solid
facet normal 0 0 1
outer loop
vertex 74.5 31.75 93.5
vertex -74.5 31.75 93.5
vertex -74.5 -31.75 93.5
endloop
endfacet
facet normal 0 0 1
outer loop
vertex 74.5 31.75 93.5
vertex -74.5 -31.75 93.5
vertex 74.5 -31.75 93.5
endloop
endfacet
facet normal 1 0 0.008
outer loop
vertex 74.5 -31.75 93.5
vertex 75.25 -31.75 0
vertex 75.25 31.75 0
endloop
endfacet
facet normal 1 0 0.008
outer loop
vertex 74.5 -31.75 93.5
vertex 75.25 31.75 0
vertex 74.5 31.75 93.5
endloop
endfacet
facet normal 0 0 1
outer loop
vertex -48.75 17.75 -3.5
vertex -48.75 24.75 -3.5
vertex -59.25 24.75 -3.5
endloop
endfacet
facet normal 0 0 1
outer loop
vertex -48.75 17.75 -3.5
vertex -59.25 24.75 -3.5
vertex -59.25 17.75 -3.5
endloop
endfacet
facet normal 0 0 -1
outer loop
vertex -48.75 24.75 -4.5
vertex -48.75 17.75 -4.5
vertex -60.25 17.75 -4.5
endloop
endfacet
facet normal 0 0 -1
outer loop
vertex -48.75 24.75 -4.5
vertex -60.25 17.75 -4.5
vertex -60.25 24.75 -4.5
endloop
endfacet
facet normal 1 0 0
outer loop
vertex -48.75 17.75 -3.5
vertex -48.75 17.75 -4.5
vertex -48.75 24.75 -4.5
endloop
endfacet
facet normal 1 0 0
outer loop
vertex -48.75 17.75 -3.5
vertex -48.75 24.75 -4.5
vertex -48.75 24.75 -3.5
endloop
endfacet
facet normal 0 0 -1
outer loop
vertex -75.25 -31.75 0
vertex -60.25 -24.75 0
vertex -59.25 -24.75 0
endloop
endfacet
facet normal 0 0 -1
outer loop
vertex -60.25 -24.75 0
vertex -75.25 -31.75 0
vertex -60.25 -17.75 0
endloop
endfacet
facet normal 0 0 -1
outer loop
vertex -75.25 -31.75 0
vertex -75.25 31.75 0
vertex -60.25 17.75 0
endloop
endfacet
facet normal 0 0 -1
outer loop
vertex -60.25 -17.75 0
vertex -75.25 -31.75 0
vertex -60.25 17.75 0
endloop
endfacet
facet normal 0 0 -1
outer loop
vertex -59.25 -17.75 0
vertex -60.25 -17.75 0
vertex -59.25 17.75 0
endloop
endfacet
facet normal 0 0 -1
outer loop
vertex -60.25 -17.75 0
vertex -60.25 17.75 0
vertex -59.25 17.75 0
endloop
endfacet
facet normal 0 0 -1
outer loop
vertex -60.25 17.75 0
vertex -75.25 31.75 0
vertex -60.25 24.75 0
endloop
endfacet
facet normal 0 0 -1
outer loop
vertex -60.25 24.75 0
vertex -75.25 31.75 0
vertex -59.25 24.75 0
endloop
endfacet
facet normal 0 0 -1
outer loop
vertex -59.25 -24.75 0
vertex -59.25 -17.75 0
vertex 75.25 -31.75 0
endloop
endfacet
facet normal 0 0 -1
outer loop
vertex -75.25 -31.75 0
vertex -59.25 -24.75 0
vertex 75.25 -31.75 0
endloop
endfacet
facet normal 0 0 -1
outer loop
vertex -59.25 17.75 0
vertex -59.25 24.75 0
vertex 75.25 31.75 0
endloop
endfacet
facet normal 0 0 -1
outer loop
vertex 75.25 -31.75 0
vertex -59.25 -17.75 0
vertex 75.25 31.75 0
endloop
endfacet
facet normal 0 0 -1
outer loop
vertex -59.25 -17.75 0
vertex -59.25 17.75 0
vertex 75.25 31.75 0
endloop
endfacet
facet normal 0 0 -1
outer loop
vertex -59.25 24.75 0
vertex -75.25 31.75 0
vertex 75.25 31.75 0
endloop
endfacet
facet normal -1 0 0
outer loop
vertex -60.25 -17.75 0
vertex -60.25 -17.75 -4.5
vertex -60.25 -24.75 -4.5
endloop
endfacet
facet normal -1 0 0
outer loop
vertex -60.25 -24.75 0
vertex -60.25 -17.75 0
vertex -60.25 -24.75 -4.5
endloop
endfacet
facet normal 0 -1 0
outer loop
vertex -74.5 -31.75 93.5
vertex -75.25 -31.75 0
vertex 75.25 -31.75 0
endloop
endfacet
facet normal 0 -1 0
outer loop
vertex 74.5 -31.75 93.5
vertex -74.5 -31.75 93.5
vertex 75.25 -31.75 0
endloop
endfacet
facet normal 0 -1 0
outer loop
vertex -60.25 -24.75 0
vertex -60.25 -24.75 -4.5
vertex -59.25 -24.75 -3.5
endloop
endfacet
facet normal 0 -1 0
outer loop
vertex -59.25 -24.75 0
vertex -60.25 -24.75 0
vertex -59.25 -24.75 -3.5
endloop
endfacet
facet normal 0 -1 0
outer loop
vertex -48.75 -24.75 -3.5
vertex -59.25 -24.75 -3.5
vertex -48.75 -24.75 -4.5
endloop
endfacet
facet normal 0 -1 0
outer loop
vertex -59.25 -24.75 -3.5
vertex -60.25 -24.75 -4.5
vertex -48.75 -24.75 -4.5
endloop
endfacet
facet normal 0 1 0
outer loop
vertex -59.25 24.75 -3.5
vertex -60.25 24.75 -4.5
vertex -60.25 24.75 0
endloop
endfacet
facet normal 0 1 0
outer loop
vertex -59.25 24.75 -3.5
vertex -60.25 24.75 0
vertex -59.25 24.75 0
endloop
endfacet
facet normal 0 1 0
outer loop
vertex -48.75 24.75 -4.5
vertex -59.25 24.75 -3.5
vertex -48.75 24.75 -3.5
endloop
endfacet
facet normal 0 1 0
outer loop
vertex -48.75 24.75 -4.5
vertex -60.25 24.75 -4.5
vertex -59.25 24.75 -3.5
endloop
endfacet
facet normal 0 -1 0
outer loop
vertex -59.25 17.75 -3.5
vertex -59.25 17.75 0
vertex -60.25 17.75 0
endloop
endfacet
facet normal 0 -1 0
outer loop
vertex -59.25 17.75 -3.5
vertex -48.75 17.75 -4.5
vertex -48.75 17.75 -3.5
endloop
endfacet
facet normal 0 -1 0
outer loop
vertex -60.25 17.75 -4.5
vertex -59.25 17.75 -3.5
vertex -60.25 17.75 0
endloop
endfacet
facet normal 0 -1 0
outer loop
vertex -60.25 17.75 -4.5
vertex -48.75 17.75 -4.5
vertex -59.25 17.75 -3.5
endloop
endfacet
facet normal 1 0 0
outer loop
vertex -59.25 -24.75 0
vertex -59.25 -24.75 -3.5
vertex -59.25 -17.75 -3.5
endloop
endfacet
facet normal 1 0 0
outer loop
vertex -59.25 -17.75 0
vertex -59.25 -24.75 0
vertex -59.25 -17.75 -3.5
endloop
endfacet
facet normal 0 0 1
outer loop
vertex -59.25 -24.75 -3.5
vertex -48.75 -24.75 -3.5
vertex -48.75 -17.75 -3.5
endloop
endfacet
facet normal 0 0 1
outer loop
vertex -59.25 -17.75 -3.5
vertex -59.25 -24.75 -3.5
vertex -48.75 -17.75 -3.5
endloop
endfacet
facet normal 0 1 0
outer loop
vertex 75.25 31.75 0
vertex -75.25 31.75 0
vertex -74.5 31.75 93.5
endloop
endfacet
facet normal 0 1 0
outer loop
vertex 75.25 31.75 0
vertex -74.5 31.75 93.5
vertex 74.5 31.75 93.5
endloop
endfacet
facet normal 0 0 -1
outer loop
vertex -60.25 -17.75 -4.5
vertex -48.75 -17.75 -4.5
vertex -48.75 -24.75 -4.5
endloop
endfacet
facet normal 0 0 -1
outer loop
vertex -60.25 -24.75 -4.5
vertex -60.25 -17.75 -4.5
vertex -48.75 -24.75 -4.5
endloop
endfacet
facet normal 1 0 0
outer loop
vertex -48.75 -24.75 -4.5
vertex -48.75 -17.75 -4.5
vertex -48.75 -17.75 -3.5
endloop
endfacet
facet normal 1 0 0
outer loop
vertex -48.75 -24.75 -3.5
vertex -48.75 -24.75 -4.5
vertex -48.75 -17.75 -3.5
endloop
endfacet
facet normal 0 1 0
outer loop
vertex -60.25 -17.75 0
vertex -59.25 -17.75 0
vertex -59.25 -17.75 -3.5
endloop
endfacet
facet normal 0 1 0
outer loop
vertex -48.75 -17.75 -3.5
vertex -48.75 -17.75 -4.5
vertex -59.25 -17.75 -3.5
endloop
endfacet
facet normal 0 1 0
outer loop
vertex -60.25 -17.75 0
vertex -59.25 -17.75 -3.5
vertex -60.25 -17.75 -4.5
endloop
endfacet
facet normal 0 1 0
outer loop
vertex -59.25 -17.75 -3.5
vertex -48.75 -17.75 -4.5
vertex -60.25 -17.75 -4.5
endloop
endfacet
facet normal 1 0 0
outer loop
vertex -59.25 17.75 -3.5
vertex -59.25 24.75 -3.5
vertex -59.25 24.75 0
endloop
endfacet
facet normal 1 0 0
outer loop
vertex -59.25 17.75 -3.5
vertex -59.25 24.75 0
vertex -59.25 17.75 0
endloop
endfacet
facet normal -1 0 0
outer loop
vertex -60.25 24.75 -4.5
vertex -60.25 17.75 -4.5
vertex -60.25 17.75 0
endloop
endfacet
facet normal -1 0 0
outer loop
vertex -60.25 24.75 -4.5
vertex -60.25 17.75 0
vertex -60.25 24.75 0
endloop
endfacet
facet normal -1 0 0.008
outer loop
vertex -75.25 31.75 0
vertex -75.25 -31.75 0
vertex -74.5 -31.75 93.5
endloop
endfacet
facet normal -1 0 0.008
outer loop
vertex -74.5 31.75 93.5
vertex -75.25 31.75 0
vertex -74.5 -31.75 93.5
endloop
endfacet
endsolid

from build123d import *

# Parameters (mm, degrees)
SKETCH_1_W            = 150.5
SKETCH_1_H            = 63.5
EXTRUDE_1_DEPTH       = 93.5
SKETCH_2_W            = 1
SKETCH_2_H            = 7
CUT_EXTRUDE_831_DEPTH = 136.783145125


with BuildPart() as part:
    # 草图1 → 拉伸1 (new body)
    with BuildSketch(Plane.XY):
        Rectangle(SKETCH_1_W, SKETCH_1_H)
    extrude(amount=EXTRUDE_1_DEPTH)

    # 扫描1: sweep along a path in 草图3
    with BuildLine(Plane(origin=(0, 19, 0), x_dir=(-1, 0, 0), z_dir=(0, 1, 0))) as sweep_1_path:
        Line((59.75, 0), (59.75, -4))
        Line((59.75, -4), (48.75, -4))
    # 草图2 → 扫描1 (sweep)
    with BuildSketch(Plane(origin=(0, 0, 0), x_dir=(-1, 0, 0), z_dir=(0, 0, -1))):
        with Locations((59.75, 21.25)):
            Rectangle(SKETCH_2_W, SKETCH_2_H)
    sweep_1 = sweep(path=sweep_1_path.line, transition=Transition.RIGHT)

    # 镜向1: 扫描1 across plane
    add(sweep_1.mirror(Plane.ZX))

    # 草图5 → Cut-Extrude 831 (cut, through all)
    with BuildSketch(Plane.XZ.offset(31.75)):
        Polygon((-75.25, 0), (-74.5, 93.5), (-75.25, 93.5), align=None)
        Polygon((74.5, 93.5), (75.25, 93.5), (75.25, 0), align=None)
    extrude(amount=-CUT_EXTRUDE_831_DEPTH, mode=Mode.SUBTRACT)


solid = part.part
